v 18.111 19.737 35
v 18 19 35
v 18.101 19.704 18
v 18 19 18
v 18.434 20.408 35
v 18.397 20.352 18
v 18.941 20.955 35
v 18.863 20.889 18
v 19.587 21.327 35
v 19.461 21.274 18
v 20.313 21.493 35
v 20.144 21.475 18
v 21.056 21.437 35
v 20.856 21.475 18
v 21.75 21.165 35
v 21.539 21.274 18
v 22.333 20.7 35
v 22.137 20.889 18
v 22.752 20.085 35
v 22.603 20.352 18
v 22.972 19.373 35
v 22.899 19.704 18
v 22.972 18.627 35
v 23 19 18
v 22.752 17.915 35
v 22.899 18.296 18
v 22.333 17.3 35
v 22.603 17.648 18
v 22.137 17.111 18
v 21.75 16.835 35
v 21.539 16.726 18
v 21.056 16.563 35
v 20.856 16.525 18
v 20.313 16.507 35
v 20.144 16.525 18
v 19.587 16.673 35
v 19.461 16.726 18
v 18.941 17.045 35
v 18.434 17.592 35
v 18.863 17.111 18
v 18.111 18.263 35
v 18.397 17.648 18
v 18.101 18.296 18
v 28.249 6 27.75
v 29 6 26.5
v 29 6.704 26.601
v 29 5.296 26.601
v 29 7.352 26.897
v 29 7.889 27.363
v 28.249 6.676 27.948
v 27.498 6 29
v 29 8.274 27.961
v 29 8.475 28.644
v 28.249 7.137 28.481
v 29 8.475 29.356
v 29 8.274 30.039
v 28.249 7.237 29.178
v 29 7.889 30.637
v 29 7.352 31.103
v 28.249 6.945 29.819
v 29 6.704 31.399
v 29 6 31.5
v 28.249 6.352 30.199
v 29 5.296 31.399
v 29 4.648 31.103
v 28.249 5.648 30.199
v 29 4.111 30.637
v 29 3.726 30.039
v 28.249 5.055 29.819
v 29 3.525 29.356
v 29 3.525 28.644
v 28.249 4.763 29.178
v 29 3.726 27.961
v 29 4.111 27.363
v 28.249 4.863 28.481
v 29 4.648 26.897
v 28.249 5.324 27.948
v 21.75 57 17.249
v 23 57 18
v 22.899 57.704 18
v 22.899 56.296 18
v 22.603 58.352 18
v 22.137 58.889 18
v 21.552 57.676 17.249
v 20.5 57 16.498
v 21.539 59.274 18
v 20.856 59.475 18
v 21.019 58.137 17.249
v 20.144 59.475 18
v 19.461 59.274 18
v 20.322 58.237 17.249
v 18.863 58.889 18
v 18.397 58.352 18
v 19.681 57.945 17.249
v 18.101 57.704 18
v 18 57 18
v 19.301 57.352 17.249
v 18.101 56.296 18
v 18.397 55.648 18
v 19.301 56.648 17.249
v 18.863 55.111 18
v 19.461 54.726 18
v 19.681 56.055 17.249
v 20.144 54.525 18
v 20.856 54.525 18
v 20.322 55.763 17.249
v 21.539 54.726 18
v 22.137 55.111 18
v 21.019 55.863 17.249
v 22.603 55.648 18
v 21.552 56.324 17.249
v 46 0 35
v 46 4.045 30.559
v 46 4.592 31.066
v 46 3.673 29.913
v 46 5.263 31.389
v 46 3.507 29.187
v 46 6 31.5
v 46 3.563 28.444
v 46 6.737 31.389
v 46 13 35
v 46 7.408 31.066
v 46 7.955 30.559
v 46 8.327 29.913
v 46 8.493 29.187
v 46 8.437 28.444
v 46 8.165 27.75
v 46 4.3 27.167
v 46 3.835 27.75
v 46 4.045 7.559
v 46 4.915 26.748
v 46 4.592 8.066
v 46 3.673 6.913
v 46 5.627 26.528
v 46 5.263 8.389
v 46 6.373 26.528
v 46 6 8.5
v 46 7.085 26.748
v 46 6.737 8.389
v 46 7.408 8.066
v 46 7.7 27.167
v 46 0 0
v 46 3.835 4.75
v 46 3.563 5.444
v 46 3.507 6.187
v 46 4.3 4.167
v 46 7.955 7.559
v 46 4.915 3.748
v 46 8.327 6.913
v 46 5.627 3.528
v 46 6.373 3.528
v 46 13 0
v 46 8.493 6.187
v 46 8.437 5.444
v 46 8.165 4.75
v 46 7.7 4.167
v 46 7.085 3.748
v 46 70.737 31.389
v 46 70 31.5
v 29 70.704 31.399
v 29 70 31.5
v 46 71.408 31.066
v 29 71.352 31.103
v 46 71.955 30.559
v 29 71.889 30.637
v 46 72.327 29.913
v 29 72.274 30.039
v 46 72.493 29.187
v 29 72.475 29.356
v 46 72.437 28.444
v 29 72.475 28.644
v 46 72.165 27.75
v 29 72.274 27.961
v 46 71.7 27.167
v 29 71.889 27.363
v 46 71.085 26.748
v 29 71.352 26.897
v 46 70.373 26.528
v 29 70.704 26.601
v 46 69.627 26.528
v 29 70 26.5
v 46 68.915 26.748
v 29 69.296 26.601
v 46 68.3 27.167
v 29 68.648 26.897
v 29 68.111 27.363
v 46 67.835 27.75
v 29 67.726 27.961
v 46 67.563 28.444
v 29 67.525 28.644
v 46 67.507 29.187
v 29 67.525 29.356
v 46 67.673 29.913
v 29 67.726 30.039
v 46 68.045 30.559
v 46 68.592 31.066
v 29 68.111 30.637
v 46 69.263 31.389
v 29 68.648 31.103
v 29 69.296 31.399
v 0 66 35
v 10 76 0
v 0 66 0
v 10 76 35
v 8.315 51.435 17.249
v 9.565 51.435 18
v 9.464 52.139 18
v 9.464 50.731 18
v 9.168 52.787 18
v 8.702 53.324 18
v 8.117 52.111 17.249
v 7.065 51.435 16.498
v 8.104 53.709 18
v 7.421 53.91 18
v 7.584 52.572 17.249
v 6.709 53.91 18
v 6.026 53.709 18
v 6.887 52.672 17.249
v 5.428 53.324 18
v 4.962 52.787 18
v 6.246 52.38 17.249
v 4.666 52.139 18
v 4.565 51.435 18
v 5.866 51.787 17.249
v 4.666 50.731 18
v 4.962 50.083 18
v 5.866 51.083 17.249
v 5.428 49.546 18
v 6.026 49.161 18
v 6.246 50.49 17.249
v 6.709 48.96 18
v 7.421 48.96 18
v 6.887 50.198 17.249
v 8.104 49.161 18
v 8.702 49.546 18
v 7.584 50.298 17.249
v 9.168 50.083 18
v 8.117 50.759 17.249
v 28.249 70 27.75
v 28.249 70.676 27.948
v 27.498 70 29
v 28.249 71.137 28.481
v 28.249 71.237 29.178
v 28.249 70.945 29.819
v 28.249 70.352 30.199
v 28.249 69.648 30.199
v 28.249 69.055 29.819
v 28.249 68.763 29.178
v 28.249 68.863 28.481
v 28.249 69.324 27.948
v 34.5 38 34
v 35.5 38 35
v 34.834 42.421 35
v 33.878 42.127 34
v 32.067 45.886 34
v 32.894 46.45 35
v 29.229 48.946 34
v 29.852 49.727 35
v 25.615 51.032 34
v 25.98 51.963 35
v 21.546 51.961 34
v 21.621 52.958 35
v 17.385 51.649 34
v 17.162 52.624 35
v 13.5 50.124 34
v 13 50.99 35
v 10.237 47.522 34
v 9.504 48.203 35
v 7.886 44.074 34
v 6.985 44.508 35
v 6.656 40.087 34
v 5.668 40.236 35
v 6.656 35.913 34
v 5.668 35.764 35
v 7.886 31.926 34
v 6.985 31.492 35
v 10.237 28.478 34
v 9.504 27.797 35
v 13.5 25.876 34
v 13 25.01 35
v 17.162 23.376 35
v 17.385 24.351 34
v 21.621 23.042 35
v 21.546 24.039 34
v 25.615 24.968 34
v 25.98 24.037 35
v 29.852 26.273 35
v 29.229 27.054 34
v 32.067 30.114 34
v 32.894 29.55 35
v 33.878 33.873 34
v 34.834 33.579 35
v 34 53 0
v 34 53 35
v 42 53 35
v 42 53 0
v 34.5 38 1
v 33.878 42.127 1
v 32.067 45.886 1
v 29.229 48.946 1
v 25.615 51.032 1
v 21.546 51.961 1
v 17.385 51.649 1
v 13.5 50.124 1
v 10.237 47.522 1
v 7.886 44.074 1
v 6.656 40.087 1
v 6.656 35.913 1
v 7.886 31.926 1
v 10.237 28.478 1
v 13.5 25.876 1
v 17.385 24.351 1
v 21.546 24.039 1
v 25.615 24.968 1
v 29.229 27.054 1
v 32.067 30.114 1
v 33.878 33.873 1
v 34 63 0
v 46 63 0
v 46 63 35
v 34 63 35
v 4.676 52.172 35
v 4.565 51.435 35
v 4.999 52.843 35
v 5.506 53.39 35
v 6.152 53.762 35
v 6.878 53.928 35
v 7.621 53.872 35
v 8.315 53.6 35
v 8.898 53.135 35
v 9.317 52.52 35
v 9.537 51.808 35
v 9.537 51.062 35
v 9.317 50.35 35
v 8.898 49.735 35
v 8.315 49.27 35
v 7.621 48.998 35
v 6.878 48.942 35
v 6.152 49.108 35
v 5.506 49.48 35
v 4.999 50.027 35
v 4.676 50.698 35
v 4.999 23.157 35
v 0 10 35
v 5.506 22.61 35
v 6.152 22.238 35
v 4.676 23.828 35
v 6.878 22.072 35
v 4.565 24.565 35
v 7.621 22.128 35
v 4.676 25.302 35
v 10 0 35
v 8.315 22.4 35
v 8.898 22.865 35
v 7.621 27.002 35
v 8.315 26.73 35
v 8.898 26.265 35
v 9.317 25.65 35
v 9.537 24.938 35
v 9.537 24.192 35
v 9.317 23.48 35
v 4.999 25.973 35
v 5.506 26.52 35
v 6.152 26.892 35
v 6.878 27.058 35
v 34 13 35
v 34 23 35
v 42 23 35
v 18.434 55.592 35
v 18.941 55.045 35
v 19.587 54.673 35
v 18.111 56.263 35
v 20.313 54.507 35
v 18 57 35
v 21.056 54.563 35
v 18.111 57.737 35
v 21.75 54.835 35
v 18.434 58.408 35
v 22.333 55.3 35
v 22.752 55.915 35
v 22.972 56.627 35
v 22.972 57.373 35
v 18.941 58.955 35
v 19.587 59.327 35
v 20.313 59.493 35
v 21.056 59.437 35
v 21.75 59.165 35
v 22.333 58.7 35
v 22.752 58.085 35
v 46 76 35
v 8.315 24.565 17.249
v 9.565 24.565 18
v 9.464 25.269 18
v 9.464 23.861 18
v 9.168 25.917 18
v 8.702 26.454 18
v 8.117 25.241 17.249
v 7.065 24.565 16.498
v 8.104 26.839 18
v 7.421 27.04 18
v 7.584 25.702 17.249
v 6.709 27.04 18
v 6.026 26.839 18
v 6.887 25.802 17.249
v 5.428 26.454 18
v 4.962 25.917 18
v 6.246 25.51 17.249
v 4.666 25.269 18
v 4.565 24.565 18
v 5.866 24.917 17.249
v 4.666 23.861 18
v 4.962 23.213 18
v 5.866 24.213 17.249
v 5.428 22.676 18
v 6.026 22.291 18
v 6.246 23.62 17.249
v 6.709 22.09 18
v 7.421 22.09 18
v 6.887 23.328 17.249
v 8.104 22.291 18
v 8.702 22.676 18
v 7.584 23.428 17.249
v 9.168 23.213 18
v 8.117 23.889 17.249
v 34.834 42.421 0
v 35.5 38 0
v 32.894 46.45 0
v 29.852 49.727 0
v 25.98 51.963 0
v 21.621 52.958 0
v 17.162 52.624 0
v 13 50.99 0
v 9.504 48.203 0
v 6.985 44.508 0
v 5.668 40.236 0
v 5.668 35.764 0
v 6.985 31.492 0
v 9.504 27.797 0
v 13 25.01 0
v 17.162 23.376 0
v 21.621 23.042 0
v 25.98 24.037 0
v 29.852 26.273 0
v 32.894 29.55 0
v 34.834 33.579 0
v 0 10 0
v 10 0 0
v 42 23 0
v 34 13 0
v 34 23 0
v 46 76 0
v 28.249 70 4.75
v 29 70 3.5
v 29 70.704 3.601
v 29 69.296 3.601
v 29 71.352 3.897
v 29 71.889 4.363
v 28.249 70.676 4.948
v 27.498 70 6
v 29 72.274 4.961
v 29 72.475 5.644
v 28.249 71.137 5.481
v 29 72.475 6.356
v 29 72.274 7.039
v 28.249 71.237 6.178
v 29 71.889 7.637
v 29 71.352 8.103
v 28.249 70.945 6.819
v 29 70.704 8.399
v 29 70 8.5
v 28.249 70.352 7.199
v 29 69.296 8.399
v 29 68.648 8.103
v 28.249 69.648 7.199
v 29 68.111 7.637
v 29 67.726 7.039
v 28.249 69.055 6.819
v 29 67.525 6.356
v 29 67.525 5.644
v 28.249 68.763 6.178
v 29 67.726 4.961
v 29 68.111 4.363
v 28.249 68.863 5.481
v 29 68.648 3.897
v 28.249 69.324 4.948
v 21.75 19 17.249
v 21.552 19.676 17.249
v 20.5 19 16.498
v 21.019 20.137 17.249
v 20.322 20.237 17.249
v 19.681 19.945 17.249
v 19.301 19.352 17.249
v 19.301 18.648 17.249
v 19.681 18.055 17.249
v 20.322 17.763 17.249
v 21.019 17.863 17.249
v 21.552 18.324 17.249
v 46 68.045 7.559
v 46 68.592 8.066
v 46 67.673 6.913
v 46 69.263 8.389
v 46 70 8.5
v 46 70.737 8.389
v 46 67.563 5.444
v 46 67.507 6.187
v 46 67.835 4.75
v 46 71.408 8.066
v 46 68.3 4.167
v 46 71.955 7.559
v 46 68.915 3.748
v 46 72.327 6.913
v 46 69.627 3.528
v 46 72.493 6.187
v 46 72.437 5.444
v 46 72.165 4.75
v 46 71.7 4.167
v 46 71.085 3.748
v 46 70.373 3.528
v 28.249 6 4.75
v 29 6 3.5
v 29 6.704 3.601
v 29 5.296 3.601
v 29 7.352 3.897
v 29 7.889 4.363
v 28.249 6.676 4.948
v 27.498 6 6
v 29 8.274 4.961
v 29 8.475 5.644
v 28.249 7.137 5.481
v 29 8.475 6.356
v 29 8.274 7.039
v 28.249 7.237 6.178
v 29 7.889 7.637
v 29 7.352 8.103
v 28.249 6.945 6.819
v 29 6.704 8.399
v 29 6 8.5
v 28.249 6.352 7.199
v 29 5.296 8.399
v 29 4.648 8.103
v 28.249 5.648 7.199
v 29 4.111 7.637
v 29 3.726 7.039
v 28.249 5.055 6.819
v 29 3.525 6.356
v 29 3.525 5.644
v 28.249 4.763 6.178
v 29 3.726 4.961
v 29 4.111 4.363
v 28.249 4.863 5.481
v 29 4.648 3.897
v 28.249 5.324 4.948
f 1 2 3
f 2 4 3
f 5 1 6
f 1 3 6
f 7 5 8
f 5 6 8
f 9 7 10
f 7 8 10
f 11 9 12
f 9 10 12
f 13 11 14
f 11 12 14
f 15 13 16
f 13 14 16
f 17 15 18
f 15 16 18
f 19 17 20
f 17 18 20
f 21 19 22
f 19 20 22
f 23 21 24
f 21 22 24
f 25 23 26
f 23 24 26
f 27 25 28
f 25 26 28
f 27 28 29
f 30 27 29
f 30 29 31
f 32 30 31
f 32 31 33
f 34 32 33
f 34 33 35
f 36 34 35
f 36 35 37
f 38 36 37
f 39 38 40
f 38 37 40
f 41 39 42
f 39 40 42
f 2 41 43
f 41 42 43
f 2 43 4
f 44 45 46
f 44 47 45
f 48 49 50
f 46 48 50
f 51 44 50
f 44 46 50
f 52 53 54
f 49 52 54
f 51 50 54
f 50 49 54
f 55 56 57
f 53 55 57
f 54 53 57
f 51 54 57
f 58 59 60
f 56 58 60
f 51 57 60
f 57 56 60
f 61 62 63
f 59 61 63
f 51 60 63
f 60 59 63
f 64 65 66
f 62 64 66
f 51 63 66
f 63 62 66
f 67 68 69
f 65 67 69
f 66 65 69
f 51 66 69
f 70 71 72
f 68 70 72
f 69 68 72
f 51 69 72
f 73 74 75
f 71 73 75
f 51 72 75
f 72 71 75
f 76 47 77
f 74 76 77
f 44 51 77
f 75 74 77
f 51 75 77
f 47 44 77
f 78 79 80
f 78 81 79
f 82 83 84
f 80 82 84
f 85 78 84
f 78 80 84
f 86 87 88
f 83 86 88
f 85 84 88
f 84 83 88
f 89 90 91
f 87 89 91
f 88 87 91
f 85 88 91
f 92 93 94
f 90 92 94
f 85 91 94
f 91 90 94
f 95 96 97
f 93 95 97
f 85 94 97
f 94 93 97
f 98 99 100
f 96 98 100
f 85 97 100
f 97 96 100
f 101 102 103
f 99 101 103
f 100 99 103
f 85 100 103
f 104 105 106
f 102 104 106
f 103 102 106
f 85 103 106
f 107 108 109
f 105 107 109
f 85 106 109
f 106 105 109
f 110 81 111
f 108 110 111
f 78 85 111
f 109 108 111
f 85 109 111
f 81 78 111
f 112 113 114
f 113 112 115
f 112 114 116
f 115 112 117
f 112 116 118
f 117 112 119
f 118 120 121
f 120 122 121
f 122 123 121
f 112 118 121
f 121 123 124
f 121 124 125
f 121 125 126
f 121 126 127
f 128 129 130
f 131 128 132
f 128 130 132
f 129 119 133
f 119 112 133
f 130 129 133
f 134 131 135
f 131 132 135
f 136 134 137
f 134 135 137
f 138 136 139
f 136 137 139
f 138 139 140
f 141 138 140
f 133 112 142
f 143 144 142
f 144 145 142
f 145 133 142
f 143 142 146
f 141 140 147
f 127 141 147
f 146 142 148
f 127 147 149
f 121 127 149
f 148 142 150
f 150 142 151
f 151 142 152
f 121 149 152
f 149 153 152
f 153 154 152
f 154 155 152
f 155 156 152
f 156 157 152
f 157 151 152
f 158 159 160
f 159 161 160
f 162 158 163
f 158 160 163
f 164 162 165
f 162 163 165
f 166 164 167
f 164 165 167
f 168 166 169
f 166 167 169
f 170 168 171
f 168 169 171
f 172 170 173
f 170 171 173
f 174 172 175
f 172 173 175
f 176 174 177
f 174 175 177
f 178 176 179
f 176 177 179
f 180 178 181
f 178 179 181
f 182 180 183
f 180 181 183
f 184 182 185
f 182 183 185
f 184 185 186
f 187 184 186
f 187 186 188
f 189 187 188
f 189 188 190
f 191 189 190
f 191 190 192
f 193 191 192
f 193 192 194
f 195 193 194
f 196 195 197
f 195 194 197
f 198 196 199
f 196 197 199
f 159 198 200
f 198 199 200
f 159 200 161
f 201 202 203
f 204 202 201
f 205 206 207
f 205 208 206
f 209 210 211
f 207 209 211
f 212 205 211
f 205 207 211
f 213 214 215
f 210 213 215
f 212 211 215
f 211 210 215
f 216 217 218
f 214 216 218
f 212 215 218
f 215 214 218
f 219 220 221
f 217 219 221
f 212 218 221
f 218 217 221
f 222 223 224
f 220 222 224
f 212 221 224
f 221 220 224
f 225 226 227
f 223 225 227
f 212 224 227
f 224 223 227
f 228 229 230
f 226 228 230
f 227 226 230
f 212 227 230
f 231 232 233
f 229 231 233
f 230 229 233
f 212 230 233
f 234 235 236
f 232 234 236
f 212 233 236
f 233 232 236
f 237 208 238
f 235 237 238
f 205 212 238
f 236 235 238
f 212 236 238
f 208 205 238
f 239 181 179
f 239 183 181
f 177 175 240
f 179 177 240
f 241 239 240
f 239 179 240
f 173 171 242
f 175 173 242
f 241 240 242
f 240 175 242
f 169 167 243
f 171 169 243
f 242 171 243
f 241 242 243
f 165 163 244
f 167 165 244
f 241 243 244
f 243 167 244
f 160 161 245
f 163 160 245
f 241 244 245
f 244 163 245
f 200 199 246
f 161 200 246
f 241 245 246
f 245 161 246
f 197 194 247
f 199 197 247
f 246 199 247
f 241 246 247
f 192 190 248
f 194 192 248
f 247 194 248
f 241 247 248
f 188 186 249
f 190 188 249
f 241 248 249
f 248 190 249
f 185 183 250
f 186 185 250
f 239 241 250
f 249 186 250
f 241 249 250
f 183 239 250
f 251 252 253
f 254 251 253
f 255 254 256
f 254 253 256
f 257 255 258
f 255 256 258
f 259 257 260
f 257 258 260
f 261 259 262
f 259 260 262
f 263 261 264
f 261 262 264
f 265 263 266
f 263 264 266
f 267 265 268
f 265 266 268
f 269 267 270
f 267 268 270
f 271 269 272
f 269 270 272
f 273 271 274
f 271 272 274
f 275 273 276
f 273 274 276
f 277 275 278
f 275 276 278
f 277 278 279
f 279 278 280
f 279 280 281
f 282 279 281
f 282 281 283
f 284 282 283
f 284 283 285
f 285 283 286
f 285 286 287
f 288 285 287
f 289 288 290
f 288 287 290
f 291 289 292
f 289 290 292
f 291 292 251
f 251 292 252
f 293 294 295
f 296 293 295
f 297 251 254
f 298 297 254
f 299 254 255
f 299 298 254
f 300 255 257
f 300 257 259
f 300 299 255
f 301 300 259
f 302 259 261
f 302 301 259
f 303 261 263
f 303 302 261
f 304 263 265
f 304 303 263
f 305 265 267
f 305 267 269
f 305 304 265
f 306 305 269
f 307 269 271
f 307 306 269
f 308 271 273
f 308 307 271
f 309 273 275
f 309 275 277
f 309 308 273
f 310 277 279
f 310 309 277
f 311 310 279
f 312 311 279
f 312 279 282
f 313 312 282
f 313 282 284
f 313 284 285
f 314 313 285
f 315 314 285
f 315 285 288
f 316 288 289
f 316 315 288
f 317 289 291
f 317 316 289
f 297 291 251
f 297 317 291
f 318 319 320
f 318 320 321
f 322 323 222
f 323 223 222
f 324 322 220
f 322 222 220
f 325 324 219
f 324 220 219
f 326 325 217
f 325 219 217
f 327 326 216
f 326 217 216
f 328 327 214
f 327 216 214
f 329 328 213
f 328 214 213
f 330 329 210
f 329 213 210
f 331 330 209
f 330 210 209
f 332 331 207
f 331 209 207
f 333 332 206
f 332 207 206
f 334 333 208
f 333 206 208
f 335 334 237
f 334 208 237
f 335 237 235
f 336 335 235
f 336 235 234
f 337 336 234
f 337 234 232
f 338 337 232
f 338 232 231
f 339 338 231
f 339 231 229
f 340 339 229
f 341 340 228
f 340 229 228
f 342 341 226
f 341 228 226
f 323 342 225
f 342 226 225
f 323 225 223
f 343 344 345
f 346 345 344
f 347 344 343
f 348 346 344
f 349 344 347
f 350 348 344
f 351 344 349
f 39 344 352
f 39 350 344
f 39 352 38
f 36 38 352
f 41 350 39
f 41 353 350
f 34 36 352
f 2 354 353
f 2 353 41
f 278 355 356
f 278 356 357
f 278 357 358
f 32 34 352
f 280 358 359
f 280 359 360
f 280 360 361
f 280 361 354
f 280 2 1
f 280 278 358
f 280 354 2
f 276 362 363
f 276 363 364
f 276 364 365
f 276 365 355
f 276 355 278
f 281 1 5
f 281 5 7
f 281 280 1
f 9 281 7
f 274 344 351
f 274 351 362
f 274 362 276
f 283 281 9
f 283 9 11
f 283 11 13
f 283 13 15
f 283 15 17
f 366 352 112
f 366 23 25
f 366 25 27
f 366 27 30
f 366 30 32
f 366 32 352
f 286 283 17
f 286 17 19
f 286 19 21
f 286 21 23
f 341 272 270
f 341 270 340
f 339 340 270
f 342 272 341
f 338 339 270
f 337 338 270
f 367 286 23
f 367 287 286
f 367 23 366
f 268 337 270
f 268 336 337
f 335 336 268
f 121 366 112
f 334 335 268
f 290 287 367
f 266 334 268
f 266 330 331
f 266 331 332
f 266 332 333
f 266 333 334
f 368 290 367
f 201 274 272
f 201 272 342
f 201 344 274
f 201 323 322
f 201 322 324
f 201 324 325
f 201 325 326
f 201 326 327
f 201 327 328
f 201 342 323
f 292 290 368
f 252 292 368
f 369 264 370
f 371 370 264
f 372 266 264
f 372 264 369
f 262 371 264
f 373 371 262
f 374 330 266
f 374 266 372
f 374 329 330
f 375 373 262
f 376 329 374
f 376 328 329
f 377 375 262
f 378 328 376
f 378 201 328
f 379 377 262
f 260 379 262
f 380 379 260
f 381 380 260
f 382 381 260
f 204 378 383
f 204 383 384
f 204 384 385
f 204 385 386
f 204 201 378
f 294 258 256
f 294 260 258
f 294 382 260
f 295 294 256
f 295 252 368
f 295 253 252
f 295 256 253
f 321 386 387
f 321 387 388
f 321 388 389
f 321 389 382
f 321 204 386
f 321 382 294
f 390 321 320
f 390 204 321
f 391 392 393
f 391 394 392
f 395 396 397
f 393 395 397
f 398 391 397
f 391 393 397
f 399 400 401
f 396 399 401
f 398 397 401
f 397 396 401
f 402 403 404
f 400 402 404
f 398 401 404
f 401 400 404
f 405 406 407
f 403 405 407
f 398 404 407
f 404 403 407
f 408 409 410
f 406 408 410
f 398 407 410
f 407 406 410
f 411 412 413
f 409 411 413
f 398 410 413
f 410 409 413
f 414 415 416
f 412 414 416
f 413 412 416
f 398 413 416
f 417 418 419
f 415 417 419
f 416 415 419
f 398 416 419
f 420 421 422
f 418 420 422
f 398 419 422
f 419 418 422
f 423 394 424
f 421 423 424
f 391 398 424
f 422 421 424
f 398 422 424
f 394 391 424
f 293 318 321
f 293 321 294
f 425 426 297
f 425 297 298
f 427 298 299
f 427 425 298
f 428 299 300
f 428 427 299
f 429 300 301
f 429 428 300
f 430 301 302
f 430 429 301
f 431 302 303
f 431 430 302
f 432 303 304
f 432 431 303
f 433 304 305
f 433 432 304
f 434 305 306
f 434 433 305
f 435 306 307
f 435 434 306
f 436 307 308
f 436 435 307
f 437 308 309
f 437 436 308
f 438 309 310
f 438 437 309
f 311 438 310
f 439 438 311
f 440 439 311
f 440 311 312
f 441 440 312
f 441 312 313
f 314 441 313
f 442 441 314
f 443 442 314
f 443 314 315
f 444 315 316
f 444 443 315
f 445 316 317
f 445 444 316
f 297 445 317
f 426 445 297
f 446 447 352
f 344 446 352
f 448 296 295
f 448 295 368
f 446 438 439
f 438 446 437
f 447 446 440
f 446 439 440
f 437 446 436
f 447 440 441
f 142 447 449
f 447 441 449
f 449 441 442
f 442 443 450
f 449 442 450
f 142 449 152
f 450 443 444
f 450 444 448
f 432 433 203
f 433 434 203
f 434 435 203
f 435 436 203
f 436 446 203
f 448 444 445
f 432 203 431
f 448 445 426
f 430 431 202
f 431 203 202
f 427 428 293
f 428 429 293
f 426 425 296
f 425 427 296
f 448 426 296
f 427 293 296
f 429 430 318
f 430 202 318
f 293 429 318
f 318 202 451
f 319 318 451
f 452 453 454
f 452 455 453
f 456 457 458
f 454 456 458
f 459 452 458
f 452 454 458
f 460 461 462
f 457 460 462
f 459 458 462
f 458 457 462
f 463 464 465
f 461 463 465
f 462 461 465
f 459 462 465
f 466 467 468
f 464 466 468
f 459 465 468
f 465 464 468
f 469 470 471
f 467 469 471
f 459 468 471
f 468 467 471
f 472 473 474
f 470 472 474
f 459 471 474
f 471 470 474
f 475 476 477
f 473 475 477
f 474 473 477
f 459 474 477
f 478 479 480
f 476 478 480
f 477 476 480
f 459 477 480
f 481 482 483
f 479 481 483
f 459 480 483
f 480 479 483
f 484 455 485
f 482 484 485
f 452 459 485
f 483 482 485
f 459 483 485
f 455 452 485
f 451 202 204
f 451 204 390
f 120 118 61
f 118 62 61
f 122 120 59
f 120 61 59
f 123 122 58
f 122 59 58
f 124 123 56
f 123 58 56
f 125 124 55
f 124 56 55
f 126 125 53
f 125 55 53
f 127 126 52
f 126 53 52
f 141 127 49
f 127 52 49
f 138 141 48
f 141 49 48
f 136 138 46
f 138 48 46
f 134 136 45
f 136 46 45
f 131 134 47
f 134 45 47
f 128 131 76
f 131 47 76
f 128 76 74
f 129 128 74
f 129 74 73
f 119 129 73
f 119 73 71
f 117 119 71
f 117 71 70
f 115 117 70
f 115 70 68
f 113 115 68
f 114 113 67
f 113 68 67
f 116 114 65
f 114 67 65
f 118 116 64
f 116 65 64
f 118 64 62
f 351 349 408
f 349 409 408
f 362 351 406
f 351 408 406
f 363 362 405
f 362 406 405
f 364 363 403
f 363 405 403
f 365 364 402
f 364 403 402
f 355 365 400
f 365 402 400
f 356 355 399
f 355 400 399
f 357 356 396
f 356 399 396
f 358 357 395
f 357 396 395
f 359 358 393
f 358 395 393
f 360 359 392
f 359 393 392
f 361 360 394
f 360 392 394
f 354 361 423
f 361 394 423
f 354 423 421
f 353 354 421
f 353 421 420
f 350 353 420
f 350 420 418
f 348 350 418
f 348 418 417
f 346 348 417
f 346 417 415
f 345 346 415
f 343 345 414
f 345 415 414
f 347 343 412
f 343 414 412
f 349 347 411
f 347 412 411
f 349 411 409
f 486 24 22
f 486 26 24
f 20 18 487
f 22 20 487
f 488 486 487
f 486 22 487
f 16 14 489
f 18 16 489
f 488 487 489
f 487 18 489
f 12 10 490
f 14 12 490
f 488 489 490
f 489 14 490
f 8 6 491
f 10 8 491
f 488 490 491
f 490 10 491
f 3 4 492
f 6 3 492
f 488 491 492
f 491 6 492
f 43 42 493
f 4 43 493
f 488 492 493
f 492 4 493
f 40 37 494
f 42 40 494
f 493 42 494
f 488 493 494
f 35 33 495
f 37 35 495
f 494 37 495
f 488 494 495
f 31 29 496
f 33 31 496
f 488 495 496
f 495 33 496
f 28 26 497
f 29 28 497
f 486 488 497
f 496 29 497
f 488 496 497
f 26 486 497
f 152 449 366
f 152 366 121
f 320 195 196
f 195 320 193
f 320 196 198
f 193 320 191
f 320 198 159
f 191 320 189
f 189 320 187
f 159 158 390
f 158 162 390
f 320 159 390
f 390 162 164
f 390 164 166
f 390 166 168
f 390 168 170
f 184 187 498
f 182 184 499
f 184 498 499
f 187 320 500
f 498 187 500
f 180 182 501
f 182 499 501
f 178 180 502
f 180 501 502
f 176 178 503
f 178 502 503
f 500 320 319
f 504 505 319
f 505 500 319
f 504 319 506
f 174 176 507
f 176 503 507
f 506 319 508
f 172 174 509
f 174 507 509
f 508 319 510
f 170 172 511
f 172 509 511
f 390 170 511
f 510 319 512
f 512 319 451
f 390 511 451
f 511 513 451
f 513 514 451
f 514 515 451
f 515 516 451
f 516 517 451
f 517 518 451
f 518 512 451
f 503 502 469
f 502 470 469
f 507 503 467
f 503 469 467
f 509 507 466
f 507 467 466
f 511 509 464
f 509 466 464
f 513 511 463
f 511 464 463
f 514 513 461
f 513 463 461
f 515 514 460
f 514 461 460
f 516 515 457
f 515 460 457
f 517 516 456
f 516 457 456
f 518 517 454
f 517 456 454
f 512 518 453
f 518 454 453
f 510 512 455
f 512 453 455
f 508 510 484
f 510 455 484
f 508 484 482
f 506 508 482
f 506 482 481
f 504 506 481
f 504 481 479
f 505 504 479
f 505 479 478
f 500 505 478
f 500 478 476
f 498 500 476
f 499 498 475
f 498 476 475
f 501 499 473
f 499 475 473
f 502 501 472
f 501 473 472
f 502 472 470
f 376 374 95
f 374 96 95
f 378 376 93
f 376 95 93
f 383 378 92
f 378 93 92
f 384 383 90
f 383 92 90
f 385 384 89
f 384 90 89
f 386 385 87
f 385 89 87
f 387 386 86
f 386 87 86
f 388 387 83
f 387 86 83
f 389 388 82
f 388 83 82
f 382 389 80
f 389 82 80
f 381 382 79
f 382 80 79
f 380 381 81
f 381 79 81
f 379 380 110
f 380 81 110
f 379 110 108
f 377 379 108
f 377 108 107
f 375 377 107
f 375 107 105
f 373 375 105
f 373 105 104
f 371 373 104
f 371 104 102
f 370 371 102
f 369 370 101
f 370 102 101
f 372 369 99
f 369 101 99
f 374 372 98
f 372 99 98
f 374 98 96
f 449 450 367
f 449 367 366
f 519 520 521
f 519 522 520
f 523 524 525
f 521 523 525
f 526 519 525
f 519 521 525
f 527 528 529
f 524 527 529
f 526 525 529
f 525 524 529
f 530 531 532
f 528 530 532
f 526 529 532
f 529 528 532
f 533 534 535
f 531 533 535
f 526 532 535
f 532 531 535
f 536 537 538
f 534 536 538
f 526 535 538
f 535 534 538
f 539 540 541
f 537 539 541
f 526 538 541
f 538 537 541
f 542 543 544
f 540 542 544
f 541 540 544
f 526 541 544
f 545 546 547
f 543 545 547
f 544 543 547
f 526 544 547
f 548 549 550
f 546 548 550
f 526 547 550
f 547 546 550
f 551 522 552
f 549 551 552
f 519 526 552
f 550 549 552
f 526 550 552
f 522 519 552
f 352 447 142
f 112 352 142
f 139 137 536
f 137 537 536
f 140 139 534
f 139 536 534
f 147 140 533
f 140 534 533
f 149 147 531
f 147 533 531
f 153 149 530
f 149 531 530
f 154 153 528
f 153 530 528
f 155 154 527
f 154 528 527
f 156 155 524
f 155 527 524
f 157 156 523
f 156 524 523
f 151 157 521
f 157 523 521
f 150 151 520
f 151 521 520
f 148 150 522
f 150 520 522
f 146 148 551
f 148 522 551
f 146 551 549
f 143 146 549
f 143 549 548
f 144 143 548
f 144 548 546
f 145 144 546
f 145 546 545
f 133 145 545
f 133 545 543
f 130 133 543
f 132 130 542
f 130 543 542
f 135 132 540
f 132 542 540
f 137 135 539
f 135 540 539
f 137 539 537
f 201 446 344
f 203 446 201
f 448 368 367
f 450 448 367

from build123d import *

# Parameters (mm, degrees)
SZKIC1_W                       = 46
SZKIC1_H                       = 76
SZKIC1_R                       = 14
DODANIE_WYCI_GNI_CIE1_DEPTH    = 35
SFAZOWANIE1_SIZE               = 1
OTW_R_GWINTOWANY_M6X1_01_D     = 5
OTW_R_GWINTOWANY_M6X1_01_DEPTH = 17
OTW_R_GWINTOWANY_M6X1_01_TIP   = 1.502151548
OTW_R_GWINTOWANY_M6X1_03_D     = 5
OTW_R_GWINTOWANY_M6X1_03_DEPTH = 17
OTW_R_GWINTOWANY_M6X1_03_TIP   = 1.502151548
SFAZOWANIE2_SIZE               = 10
WYTNIJ_WYCI_GNI_CIE1_DEPTH     = 96.482982777


with BuildPart() as part:
    # Szkic1 → Dodanie-wyciągnięcie1 (new body)
    with BuildSketch(Plane.XY):
        with Locations((23, 38)):
            Rectangle(SZKIC1_W, SZKIC1_H)
        with Locations((20.5, 38)):
            Circle(SZKIC1_R, mode=Mode.SUBTRACT)
    extrude(amount=DODANIE_WYCI_GNI_CIE1_DEPTH)

    # Sfazowanie1
    sfazowanie1_edges = [part.edges().sort_by_distance(p)[0] for p in [
        (6.5, 38, 0),
        (6.5, 38, 35),
    ]]
    chamfer(sfazowanie1_edges, length=SFAZOWANIE1_SIZE)

    # Otwór gwintowany M6x1.01
    with Locations(Plane.XY.offset(35)):
        with Locations((20.5, 57), (7.064971157, 51.435028843), (7.064971157, 24.564971157), (20.5, 19)):
            Hole(OTW_R_GWINTOWANY_M6X1_01_D / 2, depth=OTW_R_GWINTOWANY_M6X1_01_DEPTH)
            with Locations((0, 0, -(OTW_R_GWINTOWANY_M6X1_01_DEPTH + OTW_R_GWINTOWANY_M6X1_01_TIP / 2))):  # 118° drill point
                Cone(0, OTW_R_GWINTOWANY_M6X1_01_D / 2, OTW_R_GWINTOWANY_M6X1_01_TIP, mode=Mode.SUBTRACT)

    # Otwór gwintowany M6x1.03
    with Locations(Plane(origin=(46, 0, 0), x_dir=(0, 0, -1), z_dir=(1, 0, 0))):
        with Locations((-29, 70), (-6, 70), (-6, 6), (-29, 6)):
            Hole(OTW_R_GWINTOWANY_M6X1_03_D / 2, depth=OTW_R_GWINTOWANY_M6X1_03_DEPTH)
            with Locations((0, 0, -(OTW_R_GWINTOWANY_M6X1_03_DEPTH + OTW_R_GWINTOWANY_M6X1_03_TIP / 2))):  # 118° drill point
                Cone(0, OTW_R_GWINTOWANY_M6X1_03_D / 2, OTW_R_GWINTOWANY_M6X1_03_TIP, mode=Mode.SUBTRACT)

    # Sfazowanie2
    sfazowanie2_edges = [part.edges().sort_by_distance(p)[0] for p in [
        (0, 76, 17.5),
        (0, 0, 17.5),
    ]]
    chamfer(sfazowanie2_edges, length=SFAZOWANIE2_SIZE)

    # Szkic10 → Wytnij-wyciągnięcie1 (cut, through all)
    with BuildSketch(Plane(origin=(0, 0, 0), x_dir=(-1, 0, 0), z_dir=(0, 0, -1))):
        Polygon((-46, 13), (-46, 63), (-34, 63), (-34, 53), (-42, 53), (-42, 23), (-34, 23), (-34, 13), align=None)
    extrude(amount=-WYTNIJ_WYCI_GNI_CIE1_DEPTH, mode=Mode.SUBTRACT)


solid = part.part
